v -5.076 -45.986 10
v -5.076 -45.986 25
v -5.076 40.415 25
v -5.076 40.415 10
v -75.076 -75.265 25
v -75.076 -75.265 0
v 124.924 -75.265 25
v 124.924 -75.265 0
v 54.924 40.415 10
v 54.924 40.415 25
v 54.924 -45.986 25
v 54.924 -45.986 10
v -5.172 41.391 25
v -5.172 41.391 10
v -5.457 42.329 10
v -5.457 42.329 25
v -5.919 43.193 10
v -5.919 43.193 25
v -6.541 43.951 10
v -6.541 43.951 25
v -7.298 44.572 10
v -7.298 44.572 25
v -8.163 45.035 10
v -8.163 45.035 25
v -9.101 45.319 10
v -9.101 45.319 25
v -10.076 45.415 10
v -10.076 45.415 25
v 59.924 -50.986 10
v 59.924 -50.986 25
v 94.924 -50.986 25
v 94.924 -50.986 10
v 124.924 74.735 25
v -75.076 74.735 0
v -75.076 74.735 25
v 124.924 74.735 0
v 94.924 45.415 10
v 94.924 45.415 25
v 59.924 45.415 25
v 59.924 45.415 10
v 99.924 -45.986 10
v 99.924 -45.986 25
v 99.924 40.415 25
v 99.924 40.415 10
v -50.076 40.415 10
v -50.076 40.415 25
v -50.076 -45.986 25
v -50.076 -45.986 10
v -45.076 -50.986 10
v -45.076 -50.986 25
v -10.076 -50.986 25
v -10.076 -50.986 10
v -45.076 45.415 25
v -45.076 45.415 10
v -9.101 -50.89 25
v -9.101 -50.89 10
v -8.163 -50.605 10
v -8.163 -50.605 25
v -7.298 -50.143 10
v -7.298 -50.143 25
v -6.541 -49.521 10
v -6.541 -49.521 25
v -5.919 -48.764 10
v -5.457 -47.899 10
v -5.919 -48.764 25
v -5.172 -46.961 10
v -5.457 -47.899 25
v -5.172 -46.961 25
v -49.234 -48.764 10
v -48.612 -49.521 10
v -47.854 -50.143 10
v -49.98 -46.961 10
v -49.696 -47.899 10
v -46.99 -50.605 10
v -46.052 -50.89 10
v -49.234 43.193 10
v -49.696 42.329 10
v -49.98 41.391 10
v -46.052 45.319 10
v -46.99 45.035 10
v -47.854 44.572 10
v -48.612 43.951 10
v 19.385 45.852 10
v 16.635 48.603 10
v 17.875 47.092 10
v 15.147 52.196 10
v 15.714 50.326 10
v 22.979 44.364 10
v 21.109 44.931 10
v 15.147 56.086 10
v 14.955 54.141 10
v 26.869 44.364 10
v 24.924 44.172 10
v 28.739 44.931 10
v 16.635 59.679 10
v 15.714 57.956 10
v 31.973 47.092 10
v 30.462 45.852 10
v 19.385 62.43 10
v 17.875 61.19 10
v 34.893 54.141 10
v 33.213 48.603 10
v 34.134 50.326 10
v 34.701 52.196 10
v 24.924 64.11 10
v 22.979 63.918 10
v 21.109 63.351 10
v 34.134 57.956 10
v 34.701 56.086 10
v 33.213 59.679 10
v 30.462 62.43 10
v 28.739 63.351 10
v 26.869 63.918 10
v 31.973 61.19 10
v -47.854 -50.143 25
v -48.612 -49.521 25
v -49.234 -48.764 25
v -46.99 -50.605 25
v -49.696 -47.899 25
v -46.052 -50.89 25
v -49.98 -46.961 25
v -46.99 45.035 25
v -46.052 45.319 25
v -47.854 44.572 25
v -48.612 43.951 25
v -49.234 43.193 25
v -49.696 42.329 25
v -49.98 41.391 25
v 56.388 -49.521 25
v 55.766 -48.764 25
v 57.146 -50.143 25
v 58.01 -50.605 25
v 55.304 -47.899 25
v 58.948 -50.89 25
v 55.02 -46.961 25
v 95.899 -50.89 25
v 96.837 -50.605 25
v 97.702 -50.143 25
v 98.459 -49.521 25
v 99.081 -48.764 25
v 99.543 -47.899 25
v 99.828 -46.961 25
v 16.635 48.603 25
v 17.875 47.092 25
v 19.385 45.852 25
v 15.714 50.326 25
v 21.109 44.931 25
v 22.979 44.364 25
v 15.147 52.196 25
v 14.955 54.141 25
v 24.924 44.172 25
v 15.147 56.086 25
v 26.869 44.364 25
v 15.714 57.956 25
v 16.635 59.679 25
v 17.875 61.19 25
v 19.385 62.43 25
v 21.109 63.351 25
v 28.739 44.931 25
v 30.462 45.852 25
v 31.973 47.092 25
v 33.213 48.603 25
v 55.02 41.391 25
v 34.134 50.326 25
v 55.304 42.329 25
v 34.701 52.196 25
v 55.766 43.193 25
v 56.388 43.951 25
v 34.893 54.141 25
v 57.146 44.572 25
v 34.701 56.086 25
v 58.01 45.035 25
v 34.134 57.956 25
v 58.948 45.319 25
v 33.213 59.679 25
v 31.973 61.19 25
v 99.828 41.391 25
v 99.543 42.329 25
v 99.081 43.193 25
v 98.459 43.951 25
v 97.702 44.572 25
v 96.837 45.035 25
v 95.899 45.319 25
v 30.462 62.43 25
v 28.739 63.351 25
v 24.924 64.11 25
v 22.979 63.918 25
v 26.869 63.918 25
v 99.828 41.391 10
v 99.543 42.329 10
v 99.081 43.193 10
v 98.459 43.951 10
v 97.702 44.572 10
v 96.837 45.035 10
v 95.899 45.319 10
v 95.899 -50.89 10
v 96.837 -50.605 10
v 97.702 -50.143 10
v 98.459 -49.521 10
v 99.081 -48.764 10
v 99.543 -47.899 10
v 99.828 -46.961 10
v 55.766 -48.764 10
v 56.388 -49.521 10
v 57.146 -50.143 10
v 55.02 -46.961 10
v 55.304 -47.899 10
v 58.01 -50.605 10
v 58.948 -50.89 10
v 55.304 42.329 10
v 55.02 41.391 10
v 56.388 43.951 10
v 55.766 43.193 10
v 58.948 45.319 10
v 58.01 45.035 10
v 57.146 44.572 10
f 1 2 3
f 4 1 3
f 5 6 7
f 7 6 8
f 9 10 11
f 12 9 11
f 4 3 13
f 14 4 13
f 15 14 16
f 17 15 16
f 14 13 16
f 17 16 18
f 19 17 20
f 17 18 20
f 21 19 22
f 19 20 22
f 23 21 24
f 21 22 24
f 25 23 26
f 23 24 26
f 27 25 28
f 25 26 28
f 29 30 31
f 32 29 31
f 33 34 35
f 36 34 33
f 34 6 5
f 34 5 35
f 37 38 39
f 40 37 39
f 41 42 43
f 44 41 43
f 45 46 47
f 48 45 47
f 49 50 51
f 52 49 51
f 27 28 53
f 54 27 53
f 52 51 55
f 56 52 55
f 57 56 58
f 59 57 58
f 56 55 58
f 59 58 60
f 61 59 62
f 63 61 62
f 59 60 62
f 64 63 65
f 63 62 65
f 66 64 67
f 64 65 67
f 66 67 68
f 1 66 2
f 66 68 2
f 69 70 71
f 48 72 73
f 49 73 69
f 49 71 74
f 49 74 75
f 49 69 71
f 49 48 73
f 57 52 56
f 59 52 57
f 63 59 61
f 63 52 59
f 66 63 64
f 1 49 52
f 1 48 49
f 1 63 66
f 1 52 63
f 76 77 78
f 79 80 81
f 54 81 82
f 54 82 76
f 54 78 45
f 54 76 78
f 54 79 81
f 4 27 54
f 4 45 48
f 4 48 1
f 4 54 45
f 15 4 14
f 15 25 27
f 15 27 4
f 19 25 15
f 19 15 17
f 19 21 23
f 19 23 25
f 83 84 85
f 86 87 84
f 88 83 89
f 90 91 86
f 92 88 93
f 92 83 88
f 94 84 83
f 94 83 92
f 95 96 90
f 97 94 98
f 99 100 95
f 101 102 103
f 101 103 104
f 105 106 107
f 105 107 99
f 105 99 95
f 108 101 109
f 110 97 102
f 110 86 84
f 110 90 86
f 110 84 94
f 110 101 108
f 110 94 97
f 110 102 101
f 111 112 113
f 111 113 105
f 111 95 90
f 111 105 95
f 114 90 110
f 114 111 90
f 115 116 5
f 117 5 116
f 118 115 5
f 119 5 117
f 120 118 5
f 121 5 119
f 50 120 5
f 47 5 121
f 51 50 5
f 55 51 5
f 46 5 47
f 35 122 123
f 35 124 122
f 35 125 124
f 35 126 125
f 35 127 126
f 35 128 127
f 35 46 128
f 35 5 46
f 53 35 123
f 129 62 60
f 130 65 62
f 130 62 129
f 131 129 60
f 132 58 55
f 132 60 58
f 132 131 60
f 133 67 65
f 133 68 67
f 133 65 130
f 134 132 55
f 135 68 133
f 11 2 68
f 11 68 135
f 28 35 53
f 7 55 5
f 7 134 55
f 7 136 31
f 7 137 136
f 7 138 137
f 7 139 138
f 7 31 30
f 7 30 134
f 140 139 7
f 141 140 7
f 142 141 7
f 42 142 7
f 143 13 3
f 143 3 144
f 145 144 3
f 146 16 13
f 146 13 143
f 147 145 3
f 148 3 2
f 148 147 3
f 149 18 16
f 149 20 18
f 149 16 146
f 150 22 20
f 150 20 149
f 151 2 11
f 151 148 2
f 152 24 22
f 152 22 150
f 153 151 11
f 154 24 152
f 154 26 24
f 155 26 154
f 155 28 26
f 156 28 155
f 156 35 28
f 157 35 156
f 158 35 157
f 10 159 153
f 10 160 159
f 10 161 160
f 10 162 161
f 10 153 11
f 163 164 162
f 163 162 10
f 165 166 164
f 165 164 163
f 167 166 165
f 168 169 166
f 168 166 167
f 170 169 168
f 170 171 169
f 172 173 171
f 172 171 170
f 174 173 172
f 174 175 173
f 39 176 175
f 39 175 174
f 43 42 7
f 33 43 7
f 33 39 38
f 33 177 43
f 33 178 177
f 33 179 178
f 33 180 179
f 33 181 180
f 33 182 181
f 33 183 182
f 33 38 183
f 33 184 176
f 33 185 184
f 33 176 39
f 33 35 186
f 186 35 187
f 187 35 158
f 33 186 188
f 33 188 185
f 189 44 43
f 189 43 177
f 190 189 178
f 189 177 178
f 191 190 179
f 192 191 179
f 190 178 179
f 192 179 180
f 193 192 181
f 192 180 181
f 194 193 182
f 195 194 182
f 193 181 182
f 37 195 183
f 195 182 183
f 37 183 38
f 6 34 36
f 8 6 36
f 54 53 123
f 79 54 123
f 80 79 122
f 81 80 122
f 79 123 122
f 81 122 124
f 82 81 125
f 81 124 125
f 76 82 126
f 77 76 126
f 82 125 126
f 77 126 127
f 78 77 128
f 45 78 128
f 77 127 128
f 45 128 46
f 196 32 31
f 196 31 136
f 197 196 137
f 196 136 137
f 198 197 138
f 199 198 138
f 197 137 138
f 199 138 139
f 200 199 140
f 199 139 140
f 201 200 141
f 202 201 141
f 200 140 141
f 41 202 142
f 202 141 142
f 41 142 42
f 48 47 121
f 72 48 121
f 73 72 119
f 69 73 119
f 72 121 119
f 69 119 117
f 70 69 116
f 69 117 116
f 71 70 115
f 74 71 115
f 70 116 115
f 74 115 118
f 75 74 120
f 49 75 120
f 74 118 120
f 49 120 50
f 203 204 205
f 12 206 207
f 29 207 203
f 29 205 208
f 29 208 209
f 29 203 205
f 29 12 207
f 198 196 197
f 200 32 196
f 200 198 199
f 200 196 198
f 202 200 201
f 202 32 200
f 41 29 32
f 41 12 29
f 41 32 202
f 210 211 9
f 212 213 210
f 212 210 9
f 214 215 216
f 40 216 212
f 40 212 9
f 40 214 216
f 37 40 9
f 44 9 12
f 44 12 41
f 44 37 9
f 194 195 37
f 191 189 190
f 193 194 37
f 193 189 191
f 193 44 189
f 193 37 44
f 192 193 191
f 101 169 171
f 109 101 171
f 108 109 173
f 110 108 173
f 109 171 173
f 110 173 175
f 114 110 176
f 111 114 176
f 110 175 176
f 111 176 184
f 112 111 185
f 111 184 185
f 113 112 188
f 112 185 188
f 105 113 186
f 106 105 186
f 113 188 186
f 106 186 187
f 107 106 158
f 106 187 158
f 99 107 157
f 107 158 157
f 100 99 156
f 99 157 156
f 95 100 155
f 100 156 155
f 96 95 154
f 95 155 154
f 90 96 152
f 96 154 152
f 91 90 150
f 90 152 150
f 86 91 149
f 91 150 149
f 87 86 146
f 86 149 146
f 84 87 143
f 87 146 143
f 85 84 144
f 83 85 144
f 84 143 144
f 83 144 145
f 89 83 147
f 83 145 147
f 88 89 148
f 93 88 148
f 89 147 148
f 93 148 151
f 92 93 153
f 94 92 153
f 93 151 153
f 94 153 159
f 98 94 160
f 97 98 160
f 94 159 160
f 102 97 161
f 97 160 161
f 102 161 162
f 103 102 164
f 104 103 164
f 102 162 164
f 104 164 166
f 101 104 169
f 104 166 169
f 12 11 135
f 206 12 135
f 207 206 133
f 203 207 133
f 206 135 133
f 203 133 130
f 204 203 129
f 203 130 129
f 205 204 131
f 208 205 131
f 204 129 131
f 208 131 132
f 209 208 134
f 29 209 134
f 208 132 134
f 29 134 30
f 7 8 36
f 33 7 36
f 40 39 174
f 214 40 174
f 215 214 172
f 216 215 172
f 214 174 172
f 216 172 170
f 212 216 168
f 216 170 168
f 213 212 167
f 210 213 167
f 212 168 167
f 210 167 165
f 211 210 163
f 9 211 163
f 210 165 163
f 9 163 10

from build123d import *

# Parameters (mm, degrees)
F0_W     = 200
F0_H     = 150
F1_DEPTH = 25
F2_R     = 9.968788
F3_DEPTH = 15
F5_DEPTH = 15


with BuildPart() as f1:
    # F0 (on Top) → F1 (new body)
    with BuildSketch(Plane.XY):
        with Locations((24.923838, -0.264797)):
            Rectangle(F0_W, F0_H)
    extrude(amount=F1_DEPTH)

    # F2 (on face) → F3 (cut)
    with BuildSketch(Plane.XY.offset(25)):
        with Locations((24.923838, 54.140884)):
            Circle(F2_R)
    extrude(amount=-F3_DEPTH, mode=Mode.SUBTRACT)

    # F4 (on face) → F5 (cut)
    with BuildSketch(Plane.XY.offset(25)):
        with BuildLine():
            Line((-10.076162, 45.415138), (-45.076162, 45.415138))
            ThreePointArc((-45.076162, 45.415138), (-48.611696, 43.950672), (-50.076162, 40.415138))
            Line((-50.076162, 40.415138), (-50.076162, -45.985725))
            ThreePointArc((-50.076162, -45.985725), (-48.611696, -49.521259), (-45.076162, -50.985725))
            Line((-45.076162, -50.985725), (-10.076162, -50.985725))
            ThreePointArc((-10.076162, -50.985725), (-6.540628, -49.521259), (-5.076162, -45.985725))
            Line((-5.076162, -45.985725), (-5.076162, 40.415138))
            ThreePointArc((-5.076162, 40.415138), (-6.540628, 43.950672), (-10.076162, 45.415138))
        make_face()
        with BuildLine():
            Line((94.923838, 45.415138), (59.923838, 45.415138))
            ThreePointArc((59.923838, 45.415138), (56.388304, 43.950672), (54.923838, 40.415138))
            Line((54.923838, 40.415138), (54.923838, -45.985725))
            ThreePointArc((54.923838, -45.985725), (56.388304, -49.521259), (59.923838, -50.985725))
            Line((59.923838, -50.985725), (94.923838, -50.985725))
            ThreePointArc((94.923838, -50.985725), (98.459372, -49.521259), (99.923838, -45.985725))
            Line((99.923838, -45.985725), (99.923838, 40.415138))
            ThreePointArc((99.923838, 40.415138), (98.459372, 43.950672), (94.923838, 45.415138))
        make_face()
    extrude(amount=-F5_DEPTH, mode=Mode.SUBTRACT)


solid = f1.part
